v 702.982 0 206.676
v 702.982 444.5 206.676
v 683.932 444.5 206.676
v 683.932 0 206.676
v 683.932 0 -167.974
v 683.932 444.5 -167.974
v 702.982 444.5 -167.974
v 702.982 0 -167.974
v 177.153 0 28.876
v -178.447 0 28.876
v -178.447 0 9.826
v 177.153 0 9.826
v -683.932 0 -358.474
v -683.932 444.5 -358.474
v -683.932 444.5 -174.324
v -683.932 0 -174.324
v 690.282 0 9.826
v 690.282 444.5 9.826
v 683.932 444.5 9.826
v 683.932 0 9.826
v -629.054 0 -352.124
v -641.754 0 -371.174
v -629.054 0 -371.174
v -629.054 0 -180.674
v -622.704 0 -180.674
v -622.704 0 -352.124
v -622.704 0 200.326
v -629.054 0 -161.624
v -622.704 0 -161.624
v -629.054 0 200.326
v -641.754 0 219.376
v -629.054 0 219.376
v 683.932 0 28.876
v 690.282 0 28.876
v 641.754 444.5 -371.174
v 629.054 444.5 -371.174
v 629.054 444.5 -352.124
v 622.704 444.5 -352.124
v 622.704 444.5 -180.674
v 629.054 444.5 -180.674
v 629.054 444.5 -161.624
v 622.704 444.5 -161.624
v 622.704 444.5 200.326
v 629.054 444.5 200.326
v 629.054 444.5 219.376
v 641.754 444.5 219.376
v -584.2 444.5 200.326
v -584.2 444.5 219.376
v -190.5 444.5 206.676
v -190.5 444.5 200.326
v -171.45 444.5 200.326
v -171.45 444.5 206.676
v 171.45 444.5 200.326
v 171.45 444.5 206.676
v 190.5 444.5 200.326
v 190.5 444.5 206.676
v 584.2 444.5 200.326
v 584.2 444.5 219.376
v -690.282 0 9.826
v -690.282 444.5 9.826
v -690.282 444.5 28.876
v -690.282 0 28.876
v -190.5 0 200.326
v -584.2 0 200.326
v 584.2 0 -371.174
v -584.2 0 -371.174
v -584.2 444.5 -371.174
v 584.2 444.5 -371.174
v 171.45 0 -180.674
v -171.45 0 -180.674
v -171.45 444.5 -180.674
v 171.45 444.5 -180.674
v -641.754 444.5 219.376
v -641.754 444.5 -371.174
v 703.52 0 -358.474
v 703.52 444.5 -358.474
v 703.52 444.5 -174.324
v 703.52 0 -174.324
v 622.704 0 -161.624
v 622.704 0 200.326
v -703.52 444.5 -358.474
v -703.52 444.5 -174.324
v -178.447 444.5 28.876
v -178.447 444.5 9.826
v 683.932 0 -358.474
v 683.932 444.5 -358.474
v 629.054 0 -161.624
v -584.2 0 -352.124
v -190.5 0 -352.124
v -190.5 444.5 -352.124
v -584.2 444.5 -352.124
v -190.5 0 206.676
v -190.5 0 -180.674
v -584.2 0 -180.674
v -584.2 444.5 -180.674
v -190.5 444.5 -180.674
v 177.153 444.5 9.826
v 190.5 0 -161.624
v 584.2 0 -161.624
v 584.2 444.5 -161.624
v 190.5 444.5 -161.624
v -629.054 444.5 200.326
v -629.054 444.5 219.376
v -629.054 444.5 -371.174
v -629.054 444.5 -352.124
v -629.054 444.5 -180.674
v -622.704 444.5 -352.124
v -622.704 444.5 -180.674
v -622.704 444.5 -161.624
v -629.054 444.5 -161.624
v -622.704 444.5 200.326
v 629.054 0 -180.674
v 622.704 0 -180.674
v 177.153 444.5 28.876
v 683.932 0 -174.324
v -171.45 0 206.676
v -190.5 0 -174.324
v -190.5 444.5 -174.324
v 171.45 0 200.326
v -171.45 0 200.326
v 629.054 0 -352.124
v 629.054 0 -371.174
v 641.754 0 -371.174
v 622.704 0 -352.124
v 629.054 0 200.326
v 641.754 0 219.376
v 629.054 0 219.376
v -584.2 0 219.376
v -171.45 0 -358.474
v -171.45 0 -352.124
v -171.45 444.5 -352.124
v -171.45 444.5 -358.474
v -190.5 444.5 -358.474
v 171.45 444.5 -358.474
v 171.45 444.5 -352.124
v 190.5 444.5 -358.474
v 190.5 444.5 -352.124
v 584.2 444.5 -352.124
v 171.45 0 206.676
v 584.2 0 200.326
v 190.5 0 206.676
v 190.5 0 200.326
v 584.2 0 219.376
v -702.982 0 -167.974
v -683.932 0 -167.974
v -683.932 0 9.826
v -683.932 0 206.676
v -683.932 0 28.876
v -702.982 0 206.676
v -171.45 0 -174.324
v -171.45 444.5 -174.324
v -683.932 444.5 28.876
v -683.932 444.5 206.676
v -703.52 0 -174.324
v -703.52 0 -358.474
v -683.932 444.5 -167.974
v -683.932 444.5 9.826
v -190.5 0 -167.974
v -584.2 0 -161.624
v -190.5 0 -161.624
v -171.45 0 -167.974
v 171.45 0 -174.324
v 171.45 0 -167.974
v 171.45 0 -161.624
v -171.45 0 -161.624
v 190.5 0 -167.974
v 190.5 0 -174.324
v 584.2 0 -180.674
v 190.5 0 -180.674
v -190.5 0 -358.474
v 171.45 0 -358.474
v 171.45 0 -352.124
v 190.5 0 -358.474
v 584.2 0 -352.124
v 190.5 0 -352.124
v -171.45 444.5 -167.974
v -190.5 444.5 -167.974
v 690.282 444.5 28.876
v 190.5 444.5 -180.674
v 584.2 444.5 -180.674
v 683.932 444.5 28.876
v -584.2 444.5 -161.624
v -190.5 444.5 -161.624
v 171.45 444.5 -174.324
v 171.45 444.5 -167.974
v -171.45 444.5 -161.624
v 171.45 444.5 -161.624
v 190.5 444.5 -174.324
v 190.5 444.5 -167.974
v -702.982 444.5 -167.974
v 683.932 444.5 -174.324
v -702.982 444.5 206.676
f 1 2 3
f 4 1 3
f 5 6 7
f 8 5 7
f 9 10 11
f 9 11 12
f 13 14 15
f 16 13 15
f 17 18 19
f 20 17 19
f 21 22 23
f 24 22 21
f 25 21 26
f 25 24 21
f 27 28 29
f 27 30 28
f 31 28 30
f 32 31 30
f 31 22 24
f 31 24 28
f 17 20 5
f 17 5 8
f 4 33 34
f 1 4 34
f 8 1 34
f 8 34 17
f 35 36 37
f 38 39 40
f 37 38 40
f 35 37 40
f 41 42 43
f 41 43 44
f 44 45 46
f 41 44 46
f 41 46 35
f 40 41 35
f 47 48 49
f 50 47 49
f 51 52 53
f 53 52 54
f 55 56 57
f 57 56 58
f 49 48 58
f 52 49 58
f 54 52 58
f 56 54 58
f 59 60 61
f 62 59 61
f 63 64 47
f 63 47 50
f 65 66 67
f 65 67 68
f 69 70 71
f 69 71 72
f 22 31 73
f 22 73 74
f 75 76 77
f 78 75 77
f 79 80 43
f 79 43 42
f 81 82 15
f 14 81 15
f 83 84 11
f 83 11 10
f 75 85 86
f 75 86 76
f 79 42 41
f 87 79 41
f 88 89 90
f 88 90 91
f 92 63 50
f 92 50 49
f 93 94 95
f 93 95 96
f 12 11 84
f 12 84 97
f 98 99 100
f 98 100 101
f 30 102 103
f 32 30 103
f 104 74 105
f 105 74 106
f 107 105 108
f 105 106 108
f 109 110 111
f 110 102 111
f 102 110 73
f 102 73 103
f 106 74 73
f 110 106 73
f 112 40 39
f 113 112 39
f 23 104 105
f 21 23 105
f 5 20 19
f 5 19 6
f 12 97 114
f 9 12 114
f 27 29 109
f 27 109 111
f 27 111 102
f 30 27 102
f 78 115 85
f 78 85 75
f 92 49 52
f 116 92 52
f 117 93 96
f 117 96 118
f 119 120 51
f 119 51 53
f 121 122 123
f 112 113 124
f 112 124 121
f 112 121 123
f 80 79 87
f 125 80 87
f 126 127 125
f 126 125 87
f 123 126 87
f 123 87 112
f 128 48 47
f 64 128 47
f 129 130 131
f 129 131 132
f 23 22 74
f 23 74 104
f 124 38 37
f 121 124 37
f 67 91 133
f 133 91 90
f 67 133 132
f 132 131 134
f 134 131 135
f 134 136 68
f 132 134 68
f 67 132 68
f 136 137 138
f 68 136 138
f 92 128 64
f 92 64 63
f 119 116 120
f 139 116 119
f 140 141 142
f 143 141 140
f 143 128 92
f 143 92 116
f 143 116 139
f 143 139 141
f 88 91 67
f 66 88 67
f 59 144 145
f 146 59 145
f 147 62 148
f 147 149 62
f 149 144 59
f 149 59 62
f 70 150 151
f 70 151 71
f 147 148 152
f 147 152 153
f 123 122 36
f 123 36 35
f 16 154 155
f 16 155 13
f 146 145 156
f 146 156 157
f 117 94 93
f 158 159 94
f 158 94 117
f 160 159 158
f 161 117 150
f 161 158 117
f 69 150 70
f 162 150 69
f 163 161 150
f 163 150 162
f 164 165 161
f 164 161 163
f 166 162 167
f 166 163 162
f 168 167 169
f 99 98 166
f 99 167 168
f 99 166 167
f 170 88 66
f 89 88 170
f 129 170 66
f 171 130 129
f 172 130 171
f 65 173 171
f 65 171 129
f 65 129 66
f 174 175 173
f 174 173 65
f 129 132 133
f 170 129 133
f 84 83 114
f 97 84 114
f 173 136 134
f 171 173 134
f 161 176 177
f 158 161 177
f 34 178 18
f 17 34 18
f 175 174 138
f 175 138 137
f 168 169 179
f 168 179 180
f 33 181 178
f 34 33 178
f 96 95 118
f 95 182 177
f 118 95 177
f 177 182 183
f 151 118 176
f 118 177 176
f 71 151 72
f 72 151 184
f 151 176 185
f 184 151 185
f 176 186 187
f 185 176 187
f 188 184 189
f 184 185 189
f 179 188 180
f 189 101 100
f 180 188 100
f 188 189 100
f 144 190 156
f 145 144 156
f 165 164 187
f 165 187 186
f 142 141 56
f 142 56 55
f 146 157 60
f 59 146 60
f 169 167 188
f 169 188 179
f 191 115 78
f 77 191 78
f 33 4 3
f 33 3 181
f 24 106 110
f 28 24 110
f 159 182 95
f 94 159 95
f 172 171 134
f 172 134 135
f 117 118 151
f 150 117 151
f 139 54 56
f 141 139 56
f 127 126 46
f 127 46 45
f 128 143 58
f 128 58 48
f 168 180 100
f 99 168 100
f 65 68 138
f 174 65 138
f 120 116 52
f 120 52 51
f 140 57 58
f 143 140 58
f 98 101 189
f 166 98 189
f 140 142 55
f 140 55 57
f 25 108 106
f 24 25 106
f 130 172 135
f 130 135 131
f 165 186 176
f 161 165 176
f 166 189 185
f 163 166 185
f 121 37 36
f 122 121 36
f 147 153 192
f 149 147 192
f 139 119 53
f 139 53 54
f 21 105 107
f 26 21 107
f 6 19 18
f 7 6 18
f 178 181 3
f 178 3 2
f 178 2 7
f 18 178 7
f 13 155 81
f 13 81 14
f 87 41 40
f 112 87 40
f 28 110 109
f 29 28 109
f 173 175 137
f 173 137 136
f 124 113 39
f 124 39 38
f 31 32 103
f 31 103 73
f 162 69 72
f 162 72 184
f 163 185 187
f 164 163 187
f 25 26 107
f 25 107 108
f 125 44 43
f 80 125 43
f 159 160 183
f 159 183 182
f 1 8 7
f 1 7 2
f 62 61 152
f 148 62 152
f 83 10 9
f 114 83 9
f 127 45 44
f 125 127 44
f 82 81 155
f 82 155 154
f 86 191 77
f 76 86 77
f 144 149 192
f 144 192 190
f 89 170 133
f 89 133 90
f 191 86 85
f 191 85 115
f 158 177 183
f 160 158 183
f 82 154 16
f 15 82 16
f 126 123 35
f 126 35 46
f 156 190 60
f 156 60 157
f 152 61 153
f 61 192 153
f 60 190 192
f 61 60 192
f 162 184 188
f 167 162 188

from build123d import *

# Parameters (mm, degrees)
F1_DEPTH = 444.5
F0_W     = 355.6
F0_H     = 19.05
F0_W_2   = 19.588351
F0_H_2   = 184.15
F2_DEPTH = 444.5


with BuildPart() as f1:
    # F0 (on Front) → F1 (new body)
    with BuildSketch(Plane.XZ):
        Polygon((-629.053712, 219.37638), (-641.753712, 219.37638), (-641.753712, -371.17362), (-629.053712, -371.17362), (-629.053712, -352.12362), (-622.703712, -352.12362), (-622.703712, -180.67362), (-629.053712, -180.67362), (-629.053712, -161.62362), (-622.703712, -161.62362), (-622.703712, 200.32638), (-629.053712, 200.32638), align=None)
        Polygon((-190.5, -352.12362), (-584.2, -352.12362), (-584.2, -371.17362), (584.2, -371.17362), (584.2, -352.12362), (190.5, -352.12362), (190.5, -358.47362), (171.45, -358.47362), (171.45, -352.12362), (-171.45, -352.12362), (-171.45, -358.47362), (-190.5, -358.47362), align=None)
        Polygon((622.703712, 200.32638), (622.703712, -161.62362), (629.053712, -161.62362), (629.053712, -180.67362), (622.703712, -180.67362), (622.703712, -352.12362), (629.053712, -352.12362), (629.053712, -371.17362), (641.753712, -371.17362), (641.753712, 219.37638), (629.053712, 219.37638), (629.053712, 200.32638), align=None)
    extrude(amount=-F1_DEPTH)


with BuildPart() as f2:
    # F0 (on Front) → F2 (new body)
    with BuildSketch(Plane.XZ):
        Polygon((584.2, 219.37638), (-584.2, 219.37638), (-584.2, 200.32638), (-190.5, 200.32638), (-190.5, 206.67638), (-171.45, 206.67638), (-171.45, 200.32638), (171.45, 200.32638), (171.45, 206.67638), (190.5, 206.67638), (190.5, 200.32638), (584.2, 200.32638), align=None)
        Polygon((-702.981649, 206.67638), (-702.981649, -167.97362), (-683.931649, -167.97362), (-683.931649, 9.82638), (-690.281649, 9.82638), (-690.281649, 28.87638), (-683.931649, 28.87638), (-683.931649, 206.67638), align=None)
        with Locations((-0.647452, 19.35138)):
            Rectangle(F0_W, F0_H)
        with Locations((-693.725825, -266.39862)):
            Rectangle(F0_W_2, F0_H_2)
        with Locations((693.725825, -266.39862)):
            Rectangle(F0_W_2, F0_H_2)
        Polygon((702.981649, -167.97362), (702.981649, 206.67638), (683.931649, 206.67638), (683.931649, 28.87638), (690.281649, 28.87638), (690.281649, 9.82638), (683.931649, 9.82638), (683.931649, -167.97362), align=None)
        Polygon((-584.2, -161.62362), (-584.2, -180.67362), (-190.5, -180.67362), (-190.5, -174.32362), (-171.45, -174.32362), (-171.45, -180.67362), (171.45, -180.67362), (171.45, -174.32362), (190.5, -174.32362), (190.5, -180.67362), (584.2, -180.67362), (584.2, -161.62362), (190.5, -161.62362), (190.5, -167.97362), (171.45, -167.97362), (171.45, -161.62362), (-171.45, -161.62362), (-171.45, -167.97362), (-190.5, -167.97362), (-190.5, -161.62362), align=None)
    extrude(amount=-F2_DEPTH)


solid = Compound([f1.part, f2.part])
